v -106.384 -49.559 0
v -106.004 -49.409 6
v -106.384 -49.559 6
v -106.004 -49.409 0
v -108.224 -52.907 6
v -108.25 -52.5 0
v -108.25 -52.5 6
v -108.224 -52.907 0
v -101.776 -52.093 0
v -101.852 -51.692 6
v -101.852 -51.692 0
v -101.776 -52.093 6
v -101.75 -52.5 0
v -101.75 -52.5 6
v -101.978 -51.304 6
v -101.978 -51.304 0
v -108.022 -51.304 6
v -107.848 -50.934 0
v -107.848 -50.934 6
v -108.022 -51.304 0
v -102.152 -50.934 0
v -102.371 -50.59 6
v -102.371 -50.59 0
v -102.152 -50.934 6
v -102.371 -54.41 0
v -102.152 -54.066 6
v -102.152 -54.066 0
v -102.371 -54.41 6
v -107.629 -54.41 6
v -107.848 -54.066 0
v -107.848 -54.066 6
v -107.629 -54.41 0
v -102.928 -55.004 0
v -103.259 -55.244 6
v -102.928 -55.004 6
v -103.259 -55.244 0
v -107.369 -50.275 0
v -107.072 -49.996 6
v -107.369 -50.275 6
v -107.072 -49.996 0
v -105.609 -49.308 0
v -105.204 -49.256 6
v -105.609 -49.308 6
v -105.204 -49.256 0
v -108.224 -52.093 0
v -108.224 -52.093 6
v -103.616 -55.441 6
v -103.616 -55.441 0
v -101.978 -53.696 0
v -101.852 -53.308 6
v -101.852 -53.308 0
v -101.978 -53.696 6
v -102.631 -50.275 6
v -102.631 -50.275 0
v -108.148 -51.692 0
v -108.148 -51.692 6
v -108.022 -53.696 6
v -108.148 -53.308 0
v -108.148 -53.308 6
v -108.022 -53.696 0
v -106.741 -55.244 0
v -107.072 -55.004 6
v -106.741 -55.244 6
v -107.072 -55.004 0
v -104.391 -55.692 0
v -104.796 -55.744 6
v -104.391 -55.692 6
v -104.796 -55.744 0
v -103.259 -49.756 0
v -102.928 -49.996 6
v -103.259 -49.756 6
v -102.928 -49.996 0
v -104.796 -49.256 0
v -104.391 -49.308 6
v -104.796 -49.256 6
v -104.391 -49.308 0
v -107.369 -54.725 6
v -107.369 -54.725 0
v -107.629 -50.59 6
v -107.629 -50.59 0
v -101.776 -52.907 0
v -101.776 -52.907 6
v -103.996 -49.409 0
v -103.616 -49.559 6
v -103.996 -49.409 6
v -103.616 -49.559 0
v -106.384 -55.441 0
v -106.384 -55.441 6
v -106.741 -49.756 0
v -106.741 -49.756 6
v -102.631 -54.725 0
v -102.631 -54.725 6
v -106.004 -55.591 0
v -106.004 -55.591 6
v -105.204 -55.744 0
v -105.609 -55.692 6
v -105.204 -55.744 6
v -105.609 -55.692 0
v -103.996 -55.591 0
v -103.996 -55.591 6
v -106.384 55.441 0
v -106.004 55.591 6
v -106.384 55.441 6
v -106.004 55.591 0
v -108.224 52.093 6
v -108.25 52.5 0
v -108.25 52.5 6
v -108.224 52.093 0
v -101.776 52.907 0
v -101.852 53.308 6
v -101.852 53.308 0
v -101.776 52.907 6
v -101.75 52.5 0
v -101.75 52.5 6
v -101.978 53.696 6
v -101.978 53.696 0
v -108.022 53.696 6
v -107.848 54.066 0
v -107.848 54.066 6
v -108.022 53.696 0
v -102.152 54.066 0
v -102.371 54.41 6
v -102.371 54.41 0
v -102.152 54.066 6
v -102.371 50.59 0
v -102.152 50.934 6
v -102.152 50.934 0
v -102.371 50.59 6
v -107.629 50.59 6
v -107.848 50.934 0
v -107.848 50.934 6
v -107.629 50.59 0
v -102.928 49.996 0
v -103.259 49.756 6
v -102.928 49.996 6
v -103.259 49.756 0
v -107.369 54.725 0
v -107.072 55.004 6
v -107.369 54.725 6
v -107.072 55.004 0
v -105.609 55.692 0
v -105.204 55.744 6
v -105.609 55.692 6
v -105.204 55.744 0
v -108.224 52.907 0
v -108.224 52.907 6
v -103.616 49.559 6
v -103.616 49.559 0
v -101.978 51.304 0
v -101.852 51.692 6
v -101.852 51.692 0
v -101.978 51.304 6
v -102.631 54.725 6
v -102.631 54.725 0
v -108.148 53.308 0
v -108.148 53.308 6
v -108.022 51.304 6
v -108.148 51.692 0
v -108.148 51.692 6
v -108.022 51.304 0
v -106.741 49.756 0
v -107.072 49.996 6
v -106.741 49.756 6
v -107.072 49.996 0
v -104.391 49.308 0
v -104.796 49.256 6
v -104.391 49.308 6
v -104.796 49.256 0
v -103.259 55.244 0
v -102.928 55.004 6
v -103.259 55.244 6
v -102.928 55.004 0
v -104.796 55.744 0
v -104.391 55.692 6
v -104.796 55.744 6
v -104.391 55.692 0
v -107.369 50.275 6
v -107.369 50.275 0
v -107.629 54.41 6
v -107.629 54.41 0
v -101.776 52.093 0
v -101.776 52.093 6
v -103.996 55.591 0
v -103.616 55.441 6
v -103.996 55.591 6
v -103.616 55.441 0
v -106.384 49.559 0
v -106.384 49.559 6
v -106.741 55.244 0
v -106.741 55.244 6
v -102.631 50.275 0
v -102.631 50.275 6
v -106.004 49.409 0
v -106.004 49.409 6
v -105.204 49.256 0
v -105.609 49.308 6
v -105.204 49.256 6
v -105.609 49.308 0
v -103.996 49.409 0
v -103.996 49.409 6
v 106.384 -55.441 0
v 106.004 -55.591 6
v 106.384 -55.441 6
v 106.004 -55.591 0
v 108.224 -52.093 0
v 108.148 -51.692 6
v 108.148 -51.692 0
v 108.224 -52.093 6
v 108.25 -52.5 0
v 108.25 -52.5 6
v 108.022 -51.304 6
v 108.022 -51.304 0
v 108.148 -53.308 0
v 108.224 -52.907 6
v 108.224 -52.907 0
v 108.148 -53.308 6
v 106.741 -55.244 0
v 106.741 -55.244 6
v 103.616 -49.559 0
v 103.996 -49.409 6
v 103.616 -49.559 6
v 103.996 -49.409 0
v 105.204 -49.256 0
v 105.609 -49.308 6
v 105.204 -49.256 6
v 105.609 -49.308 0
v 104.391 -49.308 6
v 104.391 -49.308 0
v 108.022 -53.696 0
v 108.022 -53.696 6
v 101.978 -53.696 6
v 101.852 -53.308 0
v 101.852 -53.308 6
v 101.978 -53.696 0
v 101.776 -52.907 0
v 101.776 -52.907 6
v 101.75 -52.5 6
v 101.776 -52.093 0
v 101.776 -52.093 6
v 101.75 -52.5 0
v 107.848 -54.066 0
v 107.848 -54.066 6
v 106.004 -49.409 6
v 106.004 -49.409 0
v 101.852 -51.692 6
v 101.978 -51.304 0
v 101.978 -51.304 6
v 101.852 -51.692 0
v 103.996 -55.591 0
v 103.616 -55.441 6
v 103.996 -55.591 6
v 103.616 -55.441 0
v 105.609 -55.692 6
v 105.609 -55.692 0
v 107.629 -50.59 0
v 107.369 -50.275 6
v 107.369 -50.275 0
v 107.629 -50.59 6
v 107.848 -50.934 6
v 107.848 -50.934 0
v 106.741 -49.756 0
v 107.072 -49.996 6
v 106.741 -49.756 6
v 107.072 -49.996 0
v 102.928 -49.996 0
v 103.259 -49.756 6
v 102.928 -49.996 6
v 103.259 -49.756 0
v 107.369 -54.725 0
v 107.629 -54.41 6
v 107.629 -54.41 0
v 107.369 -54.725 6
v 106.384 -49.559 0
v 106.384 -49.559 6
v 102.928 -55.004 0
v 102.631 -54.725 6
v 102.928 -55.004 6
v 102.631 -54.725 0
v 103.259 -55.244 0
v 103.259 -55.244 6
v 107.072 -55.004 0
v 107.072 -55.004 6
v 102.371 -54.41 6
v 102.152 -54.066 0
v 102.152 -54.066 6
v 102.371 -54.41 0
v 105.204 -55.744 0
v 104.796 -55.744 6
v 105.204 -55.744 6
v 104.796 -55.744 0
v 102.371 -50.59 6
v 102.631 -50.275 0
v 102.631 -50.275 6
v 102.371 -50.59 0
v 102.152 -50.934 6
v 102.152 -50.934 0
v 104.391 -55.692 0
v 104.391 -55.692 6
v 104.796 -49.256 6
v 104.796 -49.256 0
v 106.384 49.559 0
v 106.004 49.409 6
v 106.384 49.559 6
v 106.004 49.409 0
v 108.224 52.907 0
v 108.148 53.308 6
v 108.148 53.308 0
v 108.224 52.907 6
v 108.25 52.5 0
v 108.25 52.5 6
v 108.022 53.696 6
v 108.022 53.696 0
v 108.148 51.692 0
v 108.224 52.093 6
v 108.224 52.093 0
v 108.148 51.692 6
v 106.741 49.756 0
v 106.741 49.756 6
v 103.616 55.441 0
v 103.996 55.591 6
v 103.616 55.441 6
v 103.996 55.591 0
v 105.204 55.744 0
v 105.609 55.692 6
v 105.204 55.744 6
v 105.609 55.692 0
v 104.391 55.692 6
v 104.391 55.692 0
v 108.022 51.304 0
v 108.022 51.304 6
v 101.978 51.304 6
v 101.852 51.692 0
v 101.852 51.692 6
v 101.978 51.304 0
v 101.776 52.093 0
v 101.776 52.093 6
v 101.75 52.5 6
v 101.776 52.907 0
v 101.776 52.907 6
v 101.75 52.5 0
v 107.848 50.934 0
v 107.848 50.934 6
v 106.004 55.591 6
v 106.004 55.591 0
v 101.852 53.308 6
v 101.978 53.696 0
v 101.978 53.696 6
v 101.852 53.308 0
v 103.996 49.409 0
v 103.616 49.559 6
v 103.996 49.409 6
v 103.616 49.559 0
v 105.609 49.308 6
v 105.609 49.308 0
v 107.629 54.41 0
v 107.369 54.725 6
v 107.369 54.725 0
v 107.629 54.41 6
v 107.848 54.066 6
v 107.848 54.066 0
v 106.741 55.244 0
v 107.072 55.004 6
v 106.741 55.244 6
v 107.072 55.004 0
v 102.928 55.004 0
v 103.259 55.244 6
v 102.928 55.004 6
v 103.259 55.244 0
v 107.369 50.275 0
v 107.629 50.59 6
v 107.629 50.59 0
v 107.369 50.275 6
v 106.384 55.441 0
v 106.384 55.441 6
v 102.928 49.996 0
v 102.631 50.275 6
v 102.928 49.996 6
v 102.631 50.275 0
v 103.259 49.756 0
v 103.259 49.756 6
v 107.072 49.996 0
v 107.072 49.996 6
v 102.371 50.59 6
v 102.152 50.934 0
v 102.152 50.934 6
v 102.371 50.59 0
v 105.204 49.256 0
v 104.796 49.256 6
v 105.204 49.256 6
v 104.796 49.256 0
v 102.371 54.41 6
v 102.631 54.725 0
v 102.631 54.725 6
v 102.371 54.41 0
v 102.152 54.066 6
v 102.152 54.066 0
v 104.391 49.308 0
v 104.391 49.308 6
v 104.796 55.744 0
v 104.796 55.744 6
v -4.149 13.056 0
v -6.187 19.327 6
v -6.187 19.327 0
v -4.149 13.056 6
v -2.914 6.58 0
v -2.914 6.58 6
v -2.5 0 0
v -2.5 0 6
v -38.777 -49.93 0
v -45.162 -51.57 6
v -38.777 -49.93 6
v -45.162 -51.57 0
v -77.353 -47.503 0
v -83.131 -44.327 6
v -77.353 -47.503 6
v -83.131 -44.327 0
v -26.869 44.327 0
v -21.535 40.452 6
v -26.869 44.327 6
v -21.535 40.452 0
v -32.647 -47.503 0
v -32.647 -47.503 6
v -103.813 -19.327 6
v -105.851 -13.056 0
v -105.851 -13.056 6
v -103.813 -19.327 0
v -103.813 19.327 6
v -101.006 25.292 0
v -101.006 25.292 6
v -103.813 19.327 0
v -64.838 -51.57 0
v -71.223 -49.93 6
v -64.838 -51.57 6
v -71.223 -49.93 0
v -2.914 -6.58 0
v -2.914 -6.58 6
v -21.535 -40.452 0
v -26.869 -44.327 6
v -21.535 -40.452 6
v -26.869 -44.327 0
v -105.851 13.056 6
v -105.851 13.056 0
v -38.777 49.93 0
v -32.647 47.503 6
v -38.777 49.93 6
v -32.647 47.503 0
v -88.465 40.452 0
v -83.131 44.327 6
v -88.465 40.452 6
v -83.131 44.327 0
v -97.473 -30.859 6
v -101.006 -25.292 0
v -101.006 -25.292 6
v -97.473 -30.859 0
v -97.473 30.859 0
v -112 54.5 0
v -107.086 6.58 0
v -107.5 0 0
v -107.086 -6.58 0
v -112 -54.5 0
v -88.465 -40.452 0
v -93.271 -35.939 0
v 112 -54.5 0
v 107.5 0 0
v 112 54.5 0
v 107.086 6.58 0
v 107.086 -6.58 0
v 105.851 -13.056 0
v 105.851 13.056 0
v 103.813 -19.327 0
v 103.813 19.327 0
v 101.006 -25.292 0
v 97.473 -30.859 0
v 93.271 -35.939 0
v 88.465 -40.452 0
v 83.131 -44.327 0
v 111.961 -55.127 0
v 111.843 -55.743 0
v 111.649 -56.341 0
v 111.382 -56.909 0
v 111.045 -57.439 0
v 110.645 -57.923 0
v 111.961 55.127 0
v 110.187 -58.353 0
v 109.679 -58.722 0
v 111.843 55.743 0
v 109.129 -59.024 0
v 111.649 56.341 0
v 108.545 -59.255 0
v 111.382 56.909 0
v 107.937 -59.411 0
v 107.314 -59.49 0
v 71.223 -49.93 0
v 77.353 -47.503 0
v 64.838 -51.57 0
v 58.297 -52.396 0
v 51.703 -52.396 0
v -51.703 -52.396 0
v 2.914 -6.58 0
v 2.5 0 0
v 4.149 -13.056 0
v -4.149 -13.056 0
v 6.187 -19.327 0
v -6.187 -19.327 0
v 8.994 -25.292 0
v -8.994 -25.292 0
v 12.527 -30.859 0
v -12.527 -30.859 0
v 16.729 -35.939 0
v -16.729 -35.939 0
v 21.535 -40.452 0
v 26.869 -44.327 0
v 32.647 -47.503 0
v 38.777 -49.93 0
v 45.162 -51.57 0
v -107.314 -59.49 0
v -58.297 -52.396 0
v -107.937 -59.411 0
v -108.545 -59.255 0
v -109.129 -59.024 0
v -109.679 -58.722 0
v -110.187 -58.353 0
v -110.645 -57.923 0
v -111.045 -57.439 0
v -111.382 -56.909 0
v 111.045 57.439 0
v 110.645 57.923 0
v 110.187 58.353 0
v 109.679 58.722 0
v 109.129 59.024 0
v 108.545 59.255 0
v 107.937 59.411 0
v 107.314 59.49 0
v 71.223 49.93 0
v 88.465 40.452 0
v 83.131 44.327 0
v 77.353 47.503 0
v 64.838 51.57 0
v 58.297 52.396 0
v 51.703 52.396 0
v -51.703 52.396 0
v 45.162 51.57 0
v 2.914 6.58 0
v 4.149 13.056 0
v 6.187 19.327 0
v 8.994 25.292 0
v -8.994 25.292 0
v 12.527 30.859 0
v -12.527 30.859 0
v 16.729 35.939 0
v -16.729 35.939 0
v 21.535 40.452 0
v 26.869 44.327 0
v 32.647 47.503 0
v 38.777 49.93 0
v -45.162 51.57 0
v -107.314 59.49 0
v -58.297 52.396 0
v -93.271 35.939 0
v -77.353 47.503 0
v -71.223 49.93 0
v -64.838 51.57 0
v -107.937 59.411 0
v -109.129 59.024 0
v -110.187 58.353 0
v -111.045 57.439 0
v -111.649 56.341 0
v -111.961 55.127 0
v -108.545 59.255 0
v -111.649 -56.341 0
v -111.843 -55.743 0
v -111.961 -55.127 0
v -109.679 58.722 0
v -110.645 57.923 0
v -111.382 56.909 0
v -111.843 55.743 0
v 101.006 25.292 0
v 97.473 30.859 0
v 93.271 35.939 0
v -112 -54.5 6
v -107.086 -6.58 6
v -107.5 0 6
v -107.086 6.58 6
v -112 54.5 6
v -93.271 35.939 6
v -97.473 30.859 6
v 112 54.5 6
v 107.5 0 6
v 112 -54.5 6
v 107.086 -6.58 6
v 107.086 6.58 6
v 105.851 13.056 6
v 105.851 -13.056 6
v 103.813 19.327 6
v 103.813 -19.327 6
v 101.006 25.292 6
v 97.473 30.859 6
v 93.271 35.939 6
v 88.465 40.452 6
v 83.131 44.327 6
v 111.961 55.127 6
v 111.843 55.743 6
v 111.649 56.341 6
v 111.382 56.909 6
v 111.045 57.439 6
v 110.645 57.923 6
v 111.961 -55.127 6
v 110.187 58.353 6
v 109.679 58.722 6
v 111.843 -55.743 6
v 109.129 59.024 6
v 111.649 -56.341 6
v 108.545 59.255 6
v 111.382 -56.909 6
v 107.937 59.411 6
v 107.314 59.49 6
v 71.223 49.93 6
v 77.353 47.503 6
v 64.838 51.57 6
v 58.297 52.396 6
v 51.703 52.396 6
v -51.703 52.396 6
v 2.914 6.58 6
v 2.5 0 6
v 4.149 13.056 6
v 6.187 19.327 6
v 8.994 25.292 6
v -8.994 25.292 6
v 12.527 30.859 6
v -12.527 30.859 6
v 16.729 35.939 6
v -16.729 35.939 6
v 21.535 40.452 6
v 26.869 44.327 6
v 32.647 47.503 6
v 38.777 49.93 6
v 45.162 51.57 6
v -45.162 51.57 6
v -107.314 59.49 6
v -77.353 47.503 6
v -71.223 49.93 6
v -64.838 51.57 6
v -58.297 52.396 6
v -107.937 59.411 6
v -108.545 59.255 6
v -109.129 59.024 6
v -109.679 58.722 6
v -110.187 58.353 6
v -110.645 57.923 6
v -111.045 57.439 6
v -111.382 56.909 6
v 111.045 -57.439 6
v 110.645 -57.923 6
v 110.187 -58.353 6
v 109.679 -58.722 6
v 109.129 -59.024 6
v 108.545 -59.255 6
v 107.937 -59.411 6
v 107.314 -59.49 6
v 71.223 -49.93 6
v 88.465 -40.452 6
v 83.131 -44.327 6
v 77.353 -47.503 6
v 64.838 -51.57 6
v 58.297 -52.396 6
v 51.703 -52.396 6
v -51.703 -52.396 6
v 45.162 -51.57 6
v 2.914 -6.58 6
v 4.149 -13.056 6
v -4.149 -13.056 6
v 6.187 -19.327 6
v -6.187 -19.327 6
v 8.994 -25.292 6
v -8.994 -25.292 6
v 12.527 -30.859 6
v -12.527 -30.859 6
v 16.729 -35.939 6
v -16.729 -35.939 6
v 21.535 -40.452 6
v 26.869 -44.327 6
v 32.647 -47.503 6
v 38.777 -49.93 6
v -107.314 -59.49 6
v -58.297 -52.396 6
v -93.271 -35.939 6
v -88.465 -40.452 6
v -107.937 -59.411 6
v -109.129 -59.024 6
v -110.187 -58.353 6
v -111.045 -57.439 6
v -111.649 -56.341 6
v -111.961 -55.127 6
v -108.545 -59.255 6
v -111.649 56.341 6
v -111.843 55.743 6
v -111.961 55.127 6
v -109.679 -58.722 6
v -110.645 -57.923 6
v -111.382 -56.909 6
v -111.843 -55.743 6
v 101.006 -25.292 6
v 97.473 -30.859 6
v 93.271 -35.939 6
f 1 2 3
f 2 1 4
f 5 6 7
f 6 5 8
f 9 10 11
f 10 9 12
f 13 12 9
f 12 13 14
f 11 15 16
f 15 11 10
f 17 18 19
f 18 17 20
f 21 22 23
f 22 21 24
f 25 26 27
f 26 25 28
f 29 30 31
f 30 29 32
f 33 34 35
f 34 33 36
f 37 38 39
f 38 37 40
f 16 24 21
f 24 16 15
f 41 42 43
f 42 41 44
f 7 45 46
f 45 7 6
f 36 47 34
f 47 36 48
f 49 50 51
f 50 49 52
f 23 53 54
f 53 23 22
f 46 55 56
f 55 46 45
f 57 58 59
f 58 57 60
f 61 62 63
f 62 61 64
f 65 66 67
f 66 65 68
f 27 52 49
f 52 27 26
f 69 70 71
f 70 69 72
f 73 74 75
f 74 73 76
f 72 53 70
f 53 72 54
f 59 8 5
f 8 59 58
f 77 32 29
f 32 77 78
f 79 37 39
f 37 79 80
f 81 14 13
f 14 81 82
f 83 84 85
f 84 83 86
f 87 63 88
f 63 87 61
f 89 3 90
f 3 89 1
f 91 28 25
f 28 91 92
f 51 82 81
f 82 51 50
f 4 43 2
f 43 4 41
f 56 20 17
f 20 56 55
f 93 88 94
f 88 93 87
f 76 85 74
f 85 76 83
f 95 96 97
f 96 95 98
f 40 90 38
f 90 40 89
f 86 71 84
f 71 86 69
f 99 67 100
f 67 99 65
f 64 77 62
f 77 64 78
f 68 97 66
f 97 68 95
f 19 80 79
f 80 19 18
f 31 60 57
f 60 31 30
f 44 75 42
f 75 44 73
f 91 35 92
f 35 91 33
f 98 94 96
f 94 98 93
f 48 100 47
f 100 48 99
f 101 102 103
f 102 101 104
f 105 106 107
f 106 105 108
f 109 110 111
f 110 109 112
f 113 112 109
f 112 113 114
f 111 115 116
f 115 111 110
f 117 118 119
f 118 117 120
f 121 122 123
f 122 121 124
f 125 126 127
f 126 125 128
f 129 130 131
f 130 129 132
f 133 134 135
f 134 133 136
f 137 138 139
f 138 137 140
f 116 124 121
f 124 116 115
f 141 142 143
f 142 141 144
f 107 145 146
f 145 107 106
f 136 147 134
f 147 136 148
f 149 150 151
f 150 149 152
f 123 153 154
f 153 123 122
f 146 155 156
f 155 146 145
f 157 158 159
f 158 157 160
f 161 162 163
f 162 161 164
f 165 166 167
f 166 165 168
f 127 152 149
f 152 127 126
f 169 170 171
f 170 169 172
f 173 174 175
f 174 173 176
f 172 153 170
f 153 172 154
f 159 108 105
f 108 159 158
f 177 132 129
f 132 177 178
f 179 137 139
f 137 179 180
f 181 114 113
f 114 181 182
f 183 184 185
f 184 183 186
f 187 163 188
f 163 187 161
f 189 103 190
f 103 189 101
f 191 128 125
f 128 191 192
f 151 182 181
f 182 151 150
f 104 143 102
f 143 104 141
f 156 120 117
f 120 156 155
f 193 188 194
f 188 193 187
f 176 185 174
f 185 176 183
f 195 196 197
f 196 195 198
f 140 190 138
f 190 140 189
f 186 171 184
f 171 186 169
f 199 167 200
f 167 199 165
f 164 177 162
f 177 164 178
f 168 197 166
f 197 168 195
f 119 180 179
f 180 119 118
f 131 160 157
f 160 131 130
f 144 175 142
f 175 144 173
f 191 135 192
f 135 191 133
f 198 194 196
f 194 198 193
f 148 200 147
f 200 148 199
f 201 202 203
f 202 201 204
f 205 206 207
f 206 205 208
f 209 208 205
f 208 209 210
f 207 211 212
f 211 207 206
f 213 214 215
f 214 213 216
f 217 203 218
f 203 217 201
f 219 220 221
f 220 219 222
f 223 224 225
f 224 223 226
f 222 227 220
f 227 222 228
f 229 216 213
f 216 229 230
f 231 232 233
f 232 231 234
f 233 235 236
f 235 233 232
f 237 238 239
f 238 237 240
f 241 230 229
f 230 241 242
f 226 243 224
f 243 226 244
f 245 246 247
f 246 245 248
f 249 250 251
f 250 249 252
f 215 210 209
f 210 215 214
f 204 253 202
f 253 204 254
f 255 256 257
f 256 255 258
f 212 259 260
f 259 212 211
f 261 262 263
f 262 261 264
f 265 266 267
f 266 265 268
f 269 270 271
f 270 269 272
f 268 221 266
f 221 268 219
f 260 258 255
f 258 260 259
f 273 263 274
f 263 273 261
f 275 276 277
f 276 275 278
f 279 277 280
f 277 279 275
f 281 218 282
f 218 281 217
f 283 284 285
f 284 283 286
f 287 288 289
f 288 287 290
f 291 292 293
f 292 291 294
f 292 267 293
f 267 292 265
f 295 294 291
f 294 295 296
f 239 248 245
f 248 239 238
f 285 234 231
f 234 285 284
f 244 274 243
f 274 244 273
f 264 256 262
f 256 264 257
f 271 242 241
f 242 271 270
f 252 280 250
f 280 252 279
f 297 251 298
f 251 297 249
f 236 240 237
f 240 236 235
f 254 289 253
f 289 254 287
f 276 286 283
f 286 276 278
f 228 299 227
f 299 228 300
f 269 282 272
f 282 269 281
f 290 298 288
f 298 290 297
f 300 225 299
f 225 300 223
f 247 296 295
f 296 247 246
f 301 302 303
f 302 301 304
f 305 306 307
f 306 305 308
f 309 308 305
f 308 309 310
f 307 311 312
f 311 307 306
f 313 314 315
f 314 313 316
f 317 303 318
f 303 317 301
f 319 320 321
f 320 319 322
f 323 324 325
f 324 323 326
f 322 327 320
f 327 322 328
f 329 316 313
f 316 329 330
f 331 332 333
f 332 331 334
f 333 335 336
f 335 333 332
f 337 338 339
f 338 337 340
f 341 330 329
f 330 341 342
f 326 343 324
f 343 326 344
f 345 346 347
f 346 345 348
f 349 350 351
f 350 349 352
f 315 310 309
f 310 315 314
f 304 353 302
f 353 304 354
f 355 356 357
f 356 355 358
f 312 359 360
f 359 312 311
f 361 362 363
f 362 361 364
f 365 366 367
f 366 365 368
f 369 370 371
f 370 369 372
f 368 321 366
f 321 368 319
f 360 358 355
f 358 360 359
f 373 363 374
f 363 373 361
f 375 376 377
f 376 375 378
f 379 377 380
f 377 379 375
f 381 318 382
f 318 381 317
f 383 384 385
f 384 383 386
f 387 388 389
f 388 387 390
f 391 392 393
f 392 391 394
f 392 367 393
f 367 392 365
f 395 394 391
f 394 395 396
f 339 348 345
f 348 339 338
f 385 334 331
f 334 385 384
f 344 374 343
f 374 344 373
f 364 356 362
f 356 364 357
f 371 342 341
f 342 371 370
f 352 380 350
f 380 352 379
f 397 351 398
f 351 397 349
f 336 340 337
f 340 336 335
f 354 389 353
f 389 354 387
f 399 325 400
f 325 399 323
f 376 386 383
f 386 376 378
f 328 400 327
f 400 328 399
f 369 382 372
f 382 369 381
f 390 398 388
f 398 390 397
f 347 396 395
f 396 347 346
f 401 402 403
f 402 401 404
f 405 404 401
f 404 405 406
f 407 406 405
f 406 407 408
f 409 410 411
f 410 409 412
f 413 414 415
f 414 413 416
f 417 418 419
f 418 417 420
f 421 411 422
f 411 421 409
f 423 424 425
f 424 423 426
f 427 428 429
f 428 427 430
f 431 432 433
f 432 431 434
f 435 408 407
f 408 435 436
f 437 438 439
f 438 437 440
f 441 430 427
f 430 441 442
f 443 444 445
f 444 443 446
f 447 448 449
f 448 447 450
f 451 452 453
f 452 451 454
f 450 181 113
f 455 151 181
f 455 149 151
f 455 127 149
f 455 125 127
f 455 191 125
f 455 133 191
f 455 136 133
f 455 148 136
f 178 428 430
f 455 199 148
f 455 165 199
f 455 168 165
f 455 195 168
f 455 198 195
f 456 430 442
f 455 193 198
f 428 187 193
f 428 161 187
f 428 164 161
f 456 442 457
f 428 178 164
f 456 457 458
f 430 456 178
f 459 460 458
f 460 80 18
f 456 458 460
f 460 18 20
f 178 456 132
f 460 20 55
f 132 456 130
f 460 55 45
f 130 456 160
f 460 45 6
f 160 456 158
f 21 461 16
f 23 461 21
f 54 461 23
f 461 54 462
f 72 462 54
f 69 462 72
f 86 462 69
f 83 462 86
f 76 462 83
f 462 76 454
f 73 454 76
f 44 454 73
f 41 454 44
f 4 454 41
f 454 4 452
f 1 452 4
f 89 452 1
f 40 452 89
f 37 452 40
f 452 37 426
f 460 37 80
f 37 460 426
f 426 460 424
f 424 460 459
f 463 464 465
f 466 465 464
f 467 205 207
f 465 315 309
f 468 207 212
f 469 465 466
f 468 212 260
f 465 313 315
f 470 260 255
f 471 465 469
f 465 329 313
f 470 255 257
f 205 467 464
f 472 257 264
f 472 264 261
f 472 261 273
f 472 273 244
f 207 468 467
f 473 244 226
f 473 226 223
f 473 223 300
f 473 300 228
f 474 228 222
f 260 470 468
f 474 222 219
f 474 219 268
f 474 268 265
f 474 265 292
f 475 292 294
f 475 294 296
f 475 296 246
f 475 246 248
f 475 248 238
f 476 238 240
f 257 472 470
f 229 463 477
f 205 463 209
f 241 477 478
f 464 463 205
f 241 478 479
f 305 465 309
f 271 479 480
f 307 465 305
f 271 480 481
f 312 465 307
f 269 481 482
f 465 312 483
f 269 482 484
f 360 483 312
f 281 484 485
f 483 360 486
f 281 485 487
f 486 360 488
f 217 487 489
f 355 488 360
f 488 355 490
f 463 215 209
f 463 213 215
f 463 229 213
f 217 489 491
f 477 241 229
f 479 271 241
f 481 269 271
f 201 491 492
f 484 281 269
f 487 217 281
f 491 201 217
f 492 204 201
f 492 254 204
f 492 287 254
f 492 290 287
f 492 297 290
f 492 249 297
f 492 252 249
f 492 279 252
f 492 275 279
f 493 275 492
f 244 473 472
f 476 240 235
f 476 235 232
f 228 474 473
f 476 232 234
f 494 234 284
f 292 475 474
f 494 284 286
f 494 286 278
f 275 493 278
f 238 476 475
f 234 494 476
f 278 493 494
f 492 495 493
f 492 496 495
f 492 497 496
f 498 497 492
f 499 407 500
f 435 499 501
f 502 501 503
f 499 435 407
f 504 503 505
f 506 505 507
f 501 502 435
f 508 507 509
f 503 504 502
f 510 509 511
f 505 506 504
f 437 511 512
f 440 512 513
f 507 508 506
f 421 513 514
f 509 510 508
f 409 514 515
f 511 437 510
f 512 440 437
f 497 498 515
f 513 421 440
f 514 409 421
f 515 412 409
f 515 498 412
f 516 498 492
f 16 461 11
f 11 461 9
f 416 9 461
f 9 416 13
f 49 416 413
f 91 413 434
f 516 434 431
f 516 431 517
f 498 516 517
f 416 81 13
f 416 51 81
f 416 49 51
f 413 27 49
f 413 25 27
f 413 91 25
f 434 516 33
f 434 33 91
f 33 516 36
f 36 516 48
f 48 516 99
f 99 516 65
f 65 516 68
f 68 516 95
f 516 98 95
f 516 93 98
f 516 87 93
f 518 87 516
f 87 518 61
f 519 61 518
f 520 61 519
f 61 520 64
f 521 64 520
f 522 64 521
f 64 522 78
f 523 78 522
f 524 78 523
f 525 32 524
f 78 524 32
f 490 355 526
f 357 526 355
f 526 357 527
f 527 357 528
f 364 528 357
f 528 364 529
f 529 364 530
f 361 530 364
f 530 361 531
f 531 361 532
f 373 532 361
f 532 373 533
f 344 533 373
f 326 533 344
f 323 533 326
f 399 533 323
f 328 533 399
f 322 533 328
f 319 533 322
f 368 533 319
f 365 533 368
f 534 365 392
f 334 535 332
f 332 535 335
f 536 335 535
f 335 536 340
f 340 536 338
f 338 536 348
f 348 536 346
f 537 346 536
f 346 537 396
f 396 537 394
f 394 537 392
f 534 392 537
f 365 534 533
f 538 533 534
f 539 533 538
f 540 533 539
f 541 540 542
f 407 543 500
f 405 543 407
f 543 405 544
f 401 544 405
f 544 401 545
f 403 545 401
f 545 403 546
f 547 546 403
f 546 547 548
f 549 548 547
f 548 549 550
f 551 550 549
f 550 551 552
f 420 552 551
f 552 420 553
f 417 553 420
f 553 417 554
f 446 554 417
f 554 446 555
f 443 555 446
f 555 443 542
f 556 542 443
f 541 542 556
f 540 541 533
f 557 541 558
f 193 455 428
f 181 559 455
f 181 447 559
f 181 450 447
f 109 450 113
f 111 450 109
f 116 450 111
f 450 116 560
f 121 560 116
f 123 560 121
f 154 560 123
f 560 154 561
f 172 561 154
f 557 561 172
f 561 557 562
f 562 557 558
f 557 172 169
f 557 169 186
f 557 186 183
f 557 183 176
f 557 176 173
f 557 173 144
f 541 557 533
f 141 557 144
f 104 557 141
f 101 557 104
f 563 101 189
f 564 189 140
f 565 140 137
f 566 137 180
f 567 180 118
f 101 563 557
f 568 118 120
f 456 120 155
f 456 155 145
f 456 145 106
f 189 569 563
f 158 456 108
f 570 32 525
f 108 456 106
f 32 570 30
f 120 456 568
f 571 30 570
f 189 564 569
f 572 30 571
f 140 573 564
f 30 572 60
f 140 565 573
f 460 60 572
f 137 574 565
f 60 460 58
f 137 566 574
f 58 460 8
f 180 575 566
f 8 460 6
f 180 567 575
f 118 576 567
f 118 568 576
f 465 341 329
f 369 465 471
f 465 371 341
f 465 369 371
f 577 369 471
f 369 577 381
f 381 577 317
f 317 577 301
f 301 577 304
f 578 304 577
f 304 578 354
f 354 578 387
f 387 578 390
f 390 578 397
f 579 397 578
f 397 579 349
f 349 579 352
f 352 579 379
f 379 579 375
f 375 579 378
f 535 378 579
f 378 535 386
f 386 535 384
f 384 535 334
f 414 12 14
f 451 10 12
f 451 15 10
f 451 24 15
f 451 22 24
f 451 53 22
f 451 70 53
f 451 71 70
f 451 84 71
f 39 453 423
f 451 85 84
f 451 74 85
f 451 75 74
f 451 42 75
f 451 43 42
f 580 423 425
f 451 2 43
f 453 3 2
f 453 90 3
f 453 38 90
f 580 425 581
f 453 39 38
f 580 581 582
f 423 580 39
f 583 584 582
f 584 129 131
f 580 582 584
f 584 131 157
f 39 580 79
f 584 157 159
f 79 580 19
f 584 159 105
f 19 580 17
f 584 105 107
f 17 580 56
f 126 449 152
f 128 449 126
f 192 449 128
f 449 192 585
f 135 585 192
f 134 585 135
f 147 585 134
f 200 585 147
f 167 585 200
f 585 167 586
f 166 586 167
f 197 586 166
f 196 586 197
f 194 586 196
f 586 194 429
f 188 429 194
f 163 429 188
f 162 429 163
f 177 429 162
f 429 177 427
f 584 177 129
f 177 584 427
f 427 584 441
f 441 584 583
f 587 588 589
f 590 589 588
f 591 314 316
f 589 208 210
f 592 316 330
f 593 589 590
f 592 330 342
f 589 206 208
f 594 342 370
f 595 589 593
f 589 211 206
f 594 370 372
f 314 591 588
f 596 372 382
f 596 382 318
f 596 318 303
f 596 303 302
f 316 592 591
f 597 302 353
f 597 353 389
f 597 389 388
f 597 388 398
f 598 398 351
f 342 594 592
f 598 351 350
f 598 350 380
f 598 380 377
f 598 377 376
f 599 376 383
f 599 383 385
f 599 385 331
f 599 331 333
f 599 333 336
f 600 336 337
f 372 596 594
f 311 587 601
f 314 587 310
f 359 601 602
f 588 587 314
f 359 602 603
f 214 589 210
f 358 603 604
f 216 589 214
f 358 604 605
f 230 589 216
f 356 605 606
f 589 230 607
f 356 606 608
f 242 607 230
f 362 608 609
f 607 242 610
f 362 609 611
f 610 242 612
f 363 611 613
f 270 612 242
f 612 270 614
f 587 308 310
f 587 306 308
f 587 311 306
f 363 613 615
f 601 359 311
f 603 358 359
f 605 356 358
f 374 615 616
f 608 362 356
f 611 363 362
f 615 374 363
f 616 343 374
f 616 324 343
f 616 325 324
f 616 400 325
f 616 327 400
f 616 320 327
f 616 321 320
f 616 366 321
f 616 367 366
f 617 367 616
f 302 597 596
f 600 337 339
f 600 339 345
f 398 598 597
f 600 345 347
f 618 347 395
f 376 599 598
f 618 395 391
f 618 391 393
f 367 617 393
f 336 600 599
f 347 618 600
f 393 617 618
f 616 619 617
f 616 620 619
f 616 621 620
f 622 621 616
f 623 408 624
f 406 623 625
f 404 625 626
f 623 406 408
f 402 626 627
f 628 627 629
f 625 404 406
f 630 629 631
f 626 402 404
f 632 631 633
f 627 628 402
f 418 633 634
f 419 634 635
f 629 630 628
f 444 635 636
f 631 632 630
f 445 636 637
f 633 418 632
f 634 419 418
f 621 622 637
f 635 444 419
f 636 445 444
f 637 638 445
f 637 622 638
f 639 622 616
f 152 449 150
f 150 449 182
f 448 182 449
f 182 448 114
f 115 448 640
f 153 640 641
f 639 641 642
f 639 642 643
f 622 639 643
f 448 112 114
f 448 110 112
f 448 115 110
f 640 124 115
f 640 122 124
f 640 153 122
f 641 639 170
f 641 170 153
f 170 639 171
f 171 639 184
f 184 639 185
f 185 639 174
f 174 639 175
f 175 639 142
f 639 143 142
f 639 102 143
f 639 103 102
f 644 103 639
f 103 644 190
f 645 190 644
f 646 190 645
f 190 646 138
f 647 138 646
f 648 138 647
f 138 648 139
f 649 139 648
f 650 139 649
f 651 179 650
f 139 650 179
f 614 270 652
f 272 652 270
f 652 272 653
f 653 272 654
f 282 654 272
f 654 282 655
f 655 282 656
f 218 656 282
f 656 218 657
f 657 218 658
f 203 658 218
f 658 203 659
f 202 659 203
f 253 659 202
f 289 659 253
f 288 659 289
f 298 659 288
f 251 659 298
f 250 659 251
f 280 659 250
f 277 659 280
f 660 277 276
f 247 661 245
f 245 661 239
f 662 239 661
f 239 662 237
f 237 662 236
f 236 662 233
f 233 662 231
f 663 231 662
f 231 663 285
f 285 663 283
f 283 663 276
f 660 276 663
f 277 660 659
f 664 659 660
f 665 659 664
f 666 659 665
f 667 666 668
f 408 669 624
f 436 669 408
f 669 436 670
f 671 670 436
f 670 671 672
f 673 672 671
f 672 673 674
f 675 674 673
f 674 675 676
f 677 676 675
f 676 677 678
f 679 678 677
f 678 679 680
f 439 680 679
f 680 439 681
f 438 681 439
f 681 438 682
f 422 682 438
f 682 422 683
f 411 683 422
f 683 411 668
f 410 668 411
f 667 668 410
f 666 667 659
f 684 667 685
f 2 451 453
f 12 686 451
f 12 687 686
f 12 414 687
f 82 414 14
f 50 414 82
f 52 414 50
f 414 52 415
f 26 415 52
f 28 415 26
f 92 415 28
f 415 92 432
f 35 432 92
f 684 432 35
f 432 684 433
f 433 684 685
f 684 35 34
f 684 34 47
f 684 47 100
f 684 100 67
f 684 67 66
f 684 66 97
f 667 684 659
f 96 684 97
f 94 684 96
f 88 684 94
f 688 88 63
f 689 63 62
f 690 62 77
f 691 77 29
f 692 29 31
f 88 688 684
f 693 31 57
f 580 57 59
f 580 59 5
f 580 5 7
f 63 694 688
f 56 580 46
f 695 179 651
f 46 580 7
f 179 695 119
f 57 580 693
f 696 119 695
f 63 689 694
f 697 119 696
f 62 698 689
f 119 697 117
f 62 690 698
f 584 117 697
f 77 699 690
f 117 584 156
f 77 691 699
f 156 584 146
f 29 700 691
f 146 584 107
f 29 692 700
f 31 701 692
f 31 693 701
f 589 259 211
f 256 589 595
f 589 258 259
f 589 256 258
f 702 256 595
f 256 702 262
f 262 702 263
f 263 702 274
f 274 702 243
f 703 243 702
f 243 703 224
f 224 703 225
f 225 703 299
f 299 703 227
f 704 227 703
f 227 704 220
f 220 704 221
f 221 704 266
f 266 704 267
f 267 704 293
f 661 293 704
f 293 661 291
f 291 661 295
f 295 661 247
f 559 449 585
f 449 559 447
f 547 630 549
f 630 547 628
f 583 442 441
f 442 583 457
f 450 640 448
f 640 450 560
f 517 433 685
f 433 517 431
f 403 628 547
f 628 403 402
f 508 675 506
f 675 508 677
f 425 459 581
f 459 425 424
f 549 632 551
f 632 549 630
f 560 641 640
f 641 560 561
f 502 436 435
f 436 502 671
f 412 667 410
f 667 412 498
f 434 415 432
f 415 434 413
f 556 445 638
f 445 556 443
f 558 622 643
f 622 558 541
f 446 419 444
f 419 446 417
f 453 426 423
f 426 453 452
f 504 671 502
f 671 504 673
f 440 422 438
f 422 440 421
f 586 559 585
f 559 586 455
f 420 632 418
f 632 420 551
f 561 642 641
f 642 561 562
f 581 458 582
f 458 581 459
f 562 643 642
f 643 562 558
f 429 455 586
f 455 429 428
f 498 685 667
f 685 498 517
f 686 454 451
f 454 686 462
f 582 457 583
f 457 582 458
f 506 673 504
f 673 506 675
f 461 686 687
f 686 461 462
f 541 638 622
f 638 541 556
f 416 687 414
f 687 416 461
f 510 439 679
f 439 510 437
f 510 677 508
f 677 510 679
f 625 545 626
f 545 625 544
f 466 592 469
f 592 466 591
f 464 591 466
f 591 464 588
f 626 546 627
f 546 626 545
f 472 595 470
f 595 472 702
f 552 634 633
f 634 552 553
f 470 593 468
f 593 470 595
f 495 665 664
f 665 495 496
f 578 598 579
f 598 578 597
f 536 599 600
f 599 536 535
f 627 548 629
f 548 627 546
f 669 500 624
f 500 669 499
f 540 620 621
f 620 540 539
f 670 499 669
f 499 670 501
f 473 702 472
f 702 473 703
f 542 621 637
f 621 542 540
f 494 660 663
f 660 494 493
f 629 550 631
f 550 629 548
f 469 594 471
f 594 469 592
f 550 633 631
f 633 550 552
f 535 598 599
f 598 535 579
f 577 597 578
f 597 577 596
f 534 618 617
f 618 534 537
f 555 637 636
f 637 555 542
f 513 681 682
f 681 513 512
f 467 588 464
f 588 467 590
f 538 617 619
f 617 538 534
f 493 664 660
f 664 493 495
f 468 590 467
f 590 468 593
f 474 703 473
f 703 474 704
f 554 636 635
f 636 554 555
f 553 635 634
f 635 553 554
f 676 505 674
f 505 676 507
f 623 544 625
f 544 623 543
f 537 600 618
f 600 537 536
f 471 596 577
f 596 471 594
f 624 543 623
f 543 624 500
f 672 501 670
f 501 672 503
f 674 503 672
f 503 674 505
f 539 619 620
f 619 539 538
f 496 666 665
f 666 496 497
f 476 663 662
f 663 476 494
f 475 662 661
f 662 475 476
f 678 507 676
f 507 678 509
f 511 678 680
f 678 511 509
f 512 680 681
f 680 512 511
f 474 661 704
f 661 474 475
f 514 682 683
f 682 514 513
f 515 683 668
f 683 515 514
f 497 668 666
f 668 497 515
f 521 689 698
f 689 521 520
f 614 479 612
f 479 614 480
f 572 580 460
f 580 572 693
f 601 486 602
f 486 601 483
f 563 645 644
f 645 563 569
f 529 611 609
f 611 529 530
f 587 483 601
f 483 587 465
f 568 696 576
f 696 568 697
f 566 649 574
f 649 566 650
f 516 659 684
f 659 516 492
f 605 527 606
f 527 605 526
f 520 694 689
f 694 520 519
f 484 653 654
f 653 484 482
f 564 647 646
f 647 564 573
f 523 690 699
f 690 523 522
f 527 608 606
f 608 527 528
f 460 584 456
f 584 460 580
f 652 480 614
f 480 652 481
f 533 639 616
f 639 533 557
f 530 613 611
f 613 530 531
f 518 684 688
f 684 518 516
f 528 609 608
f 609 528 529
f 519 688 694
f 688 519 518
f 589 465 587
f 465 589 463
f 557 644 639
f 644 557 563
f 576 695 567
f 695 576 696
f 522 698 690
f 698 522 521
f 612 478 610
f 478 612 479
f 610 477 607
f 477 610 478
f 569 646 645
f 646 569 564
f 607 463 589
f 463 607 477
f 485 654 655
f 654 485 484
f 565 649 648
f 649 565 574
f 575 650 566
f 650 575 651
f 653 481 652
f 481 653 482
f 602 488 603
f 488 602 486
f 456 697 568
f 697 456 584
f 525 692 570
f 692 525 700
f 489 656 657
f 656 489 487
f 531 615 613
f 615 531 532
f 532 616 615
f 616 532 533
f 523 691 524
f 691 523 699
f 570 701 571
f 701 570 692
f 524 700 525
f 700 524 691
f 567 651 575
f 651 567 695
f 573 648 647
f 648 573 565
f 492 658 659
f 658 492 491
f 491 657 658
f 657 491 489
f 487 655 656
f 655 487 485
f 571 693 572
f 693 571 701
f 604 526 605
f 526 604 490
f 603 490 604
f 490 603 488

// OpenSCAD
$fn = 50;


difference() {
	union() {
		hull() {
			translate(v = [-107.0000000000, 54.5000000000, 0]) {
				cylinder(h = 6, r = 5);
			}
			translate(v = [107.0000000000, 54.5000000000, 0]) {
				cylinder(h = 6, r = 5);
			}
			translate(v = [-107.0000000000, -54.5000000000, 0]) {
				cylinder(h = 6, r = 5);
			}
			translate(v = [107.0000000000, -54.5000000000, 0]) {
				cylinder(h = 6, r = 5);
			}
		}
	}
	union() {
		#translate(v = [-105.0000000000, -52.5000000000, -100.0000000000]) {
			cylinder(h = 200, r = 3.2500000000);
		}
		#translate(v = [-105.0000000000, 52.5000000000, -100.0000000000]) {
			cylinder(h = 200, r = 3.2500000000);
		}
		#translate(v = [105.0000000000, -52.5000000000, -100.0000000000]) {
			cylinder(h = 200, r = 3.2500000000);
		}
		#translate(v = [105.0000000000, 52.5000000000, -100.0000000000]) {
			cylinder(h = 200, r = 3.2500000000);
		}
		#translate(v = [-55.0000000000, 0, 0]) {
			cylinder(h = 6, r = 52.5000000000);
		}
		#translate(v = [55.0000000000, 0, 0]) {
			cylinder(h = 6, r = 52.5000000000);
		}
	}
}
